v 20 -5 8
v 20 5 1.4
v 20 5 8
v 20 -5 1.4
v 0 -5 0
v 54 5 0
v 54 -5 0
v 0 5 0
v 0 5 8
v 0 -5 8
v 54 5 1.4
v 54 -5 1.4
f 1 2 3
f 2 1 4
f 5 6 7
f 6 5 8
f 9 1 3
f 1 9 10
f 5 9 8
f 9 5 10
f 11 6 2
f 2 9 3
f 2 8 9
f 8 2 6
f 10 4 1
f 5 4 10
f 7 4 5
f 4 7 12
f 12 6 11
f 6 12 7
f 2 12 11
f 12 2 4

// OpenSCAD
// Test button spring: a printed leaf (cantilever). Its root pushes into the tunnel
// under the replica panel. Force comes from tb_leaf_t, calculated in params.scad.
// Print 4, flat on the bed.
include <../cad/params.scad>
include <../cad/lib.scad>

tip_past_stem = 6;

module test_button_leaf() {
    box(0, tb_root_l, -tb_leaf_b / 2, tb_leaf_b / 2, 0, tb_root_h);
    box(tb_root_l - 0.1, tb_root_l + tb_leaf_l + tip_past_stem, -tb_leaf_b / 2, tb_leaf_b / 2, tb_root_h - tb_leaf_t, tb_root_h);
}

translate([0, 0, tb_root_h]) mirror([0, 0, 1]) test_button_leaf();
